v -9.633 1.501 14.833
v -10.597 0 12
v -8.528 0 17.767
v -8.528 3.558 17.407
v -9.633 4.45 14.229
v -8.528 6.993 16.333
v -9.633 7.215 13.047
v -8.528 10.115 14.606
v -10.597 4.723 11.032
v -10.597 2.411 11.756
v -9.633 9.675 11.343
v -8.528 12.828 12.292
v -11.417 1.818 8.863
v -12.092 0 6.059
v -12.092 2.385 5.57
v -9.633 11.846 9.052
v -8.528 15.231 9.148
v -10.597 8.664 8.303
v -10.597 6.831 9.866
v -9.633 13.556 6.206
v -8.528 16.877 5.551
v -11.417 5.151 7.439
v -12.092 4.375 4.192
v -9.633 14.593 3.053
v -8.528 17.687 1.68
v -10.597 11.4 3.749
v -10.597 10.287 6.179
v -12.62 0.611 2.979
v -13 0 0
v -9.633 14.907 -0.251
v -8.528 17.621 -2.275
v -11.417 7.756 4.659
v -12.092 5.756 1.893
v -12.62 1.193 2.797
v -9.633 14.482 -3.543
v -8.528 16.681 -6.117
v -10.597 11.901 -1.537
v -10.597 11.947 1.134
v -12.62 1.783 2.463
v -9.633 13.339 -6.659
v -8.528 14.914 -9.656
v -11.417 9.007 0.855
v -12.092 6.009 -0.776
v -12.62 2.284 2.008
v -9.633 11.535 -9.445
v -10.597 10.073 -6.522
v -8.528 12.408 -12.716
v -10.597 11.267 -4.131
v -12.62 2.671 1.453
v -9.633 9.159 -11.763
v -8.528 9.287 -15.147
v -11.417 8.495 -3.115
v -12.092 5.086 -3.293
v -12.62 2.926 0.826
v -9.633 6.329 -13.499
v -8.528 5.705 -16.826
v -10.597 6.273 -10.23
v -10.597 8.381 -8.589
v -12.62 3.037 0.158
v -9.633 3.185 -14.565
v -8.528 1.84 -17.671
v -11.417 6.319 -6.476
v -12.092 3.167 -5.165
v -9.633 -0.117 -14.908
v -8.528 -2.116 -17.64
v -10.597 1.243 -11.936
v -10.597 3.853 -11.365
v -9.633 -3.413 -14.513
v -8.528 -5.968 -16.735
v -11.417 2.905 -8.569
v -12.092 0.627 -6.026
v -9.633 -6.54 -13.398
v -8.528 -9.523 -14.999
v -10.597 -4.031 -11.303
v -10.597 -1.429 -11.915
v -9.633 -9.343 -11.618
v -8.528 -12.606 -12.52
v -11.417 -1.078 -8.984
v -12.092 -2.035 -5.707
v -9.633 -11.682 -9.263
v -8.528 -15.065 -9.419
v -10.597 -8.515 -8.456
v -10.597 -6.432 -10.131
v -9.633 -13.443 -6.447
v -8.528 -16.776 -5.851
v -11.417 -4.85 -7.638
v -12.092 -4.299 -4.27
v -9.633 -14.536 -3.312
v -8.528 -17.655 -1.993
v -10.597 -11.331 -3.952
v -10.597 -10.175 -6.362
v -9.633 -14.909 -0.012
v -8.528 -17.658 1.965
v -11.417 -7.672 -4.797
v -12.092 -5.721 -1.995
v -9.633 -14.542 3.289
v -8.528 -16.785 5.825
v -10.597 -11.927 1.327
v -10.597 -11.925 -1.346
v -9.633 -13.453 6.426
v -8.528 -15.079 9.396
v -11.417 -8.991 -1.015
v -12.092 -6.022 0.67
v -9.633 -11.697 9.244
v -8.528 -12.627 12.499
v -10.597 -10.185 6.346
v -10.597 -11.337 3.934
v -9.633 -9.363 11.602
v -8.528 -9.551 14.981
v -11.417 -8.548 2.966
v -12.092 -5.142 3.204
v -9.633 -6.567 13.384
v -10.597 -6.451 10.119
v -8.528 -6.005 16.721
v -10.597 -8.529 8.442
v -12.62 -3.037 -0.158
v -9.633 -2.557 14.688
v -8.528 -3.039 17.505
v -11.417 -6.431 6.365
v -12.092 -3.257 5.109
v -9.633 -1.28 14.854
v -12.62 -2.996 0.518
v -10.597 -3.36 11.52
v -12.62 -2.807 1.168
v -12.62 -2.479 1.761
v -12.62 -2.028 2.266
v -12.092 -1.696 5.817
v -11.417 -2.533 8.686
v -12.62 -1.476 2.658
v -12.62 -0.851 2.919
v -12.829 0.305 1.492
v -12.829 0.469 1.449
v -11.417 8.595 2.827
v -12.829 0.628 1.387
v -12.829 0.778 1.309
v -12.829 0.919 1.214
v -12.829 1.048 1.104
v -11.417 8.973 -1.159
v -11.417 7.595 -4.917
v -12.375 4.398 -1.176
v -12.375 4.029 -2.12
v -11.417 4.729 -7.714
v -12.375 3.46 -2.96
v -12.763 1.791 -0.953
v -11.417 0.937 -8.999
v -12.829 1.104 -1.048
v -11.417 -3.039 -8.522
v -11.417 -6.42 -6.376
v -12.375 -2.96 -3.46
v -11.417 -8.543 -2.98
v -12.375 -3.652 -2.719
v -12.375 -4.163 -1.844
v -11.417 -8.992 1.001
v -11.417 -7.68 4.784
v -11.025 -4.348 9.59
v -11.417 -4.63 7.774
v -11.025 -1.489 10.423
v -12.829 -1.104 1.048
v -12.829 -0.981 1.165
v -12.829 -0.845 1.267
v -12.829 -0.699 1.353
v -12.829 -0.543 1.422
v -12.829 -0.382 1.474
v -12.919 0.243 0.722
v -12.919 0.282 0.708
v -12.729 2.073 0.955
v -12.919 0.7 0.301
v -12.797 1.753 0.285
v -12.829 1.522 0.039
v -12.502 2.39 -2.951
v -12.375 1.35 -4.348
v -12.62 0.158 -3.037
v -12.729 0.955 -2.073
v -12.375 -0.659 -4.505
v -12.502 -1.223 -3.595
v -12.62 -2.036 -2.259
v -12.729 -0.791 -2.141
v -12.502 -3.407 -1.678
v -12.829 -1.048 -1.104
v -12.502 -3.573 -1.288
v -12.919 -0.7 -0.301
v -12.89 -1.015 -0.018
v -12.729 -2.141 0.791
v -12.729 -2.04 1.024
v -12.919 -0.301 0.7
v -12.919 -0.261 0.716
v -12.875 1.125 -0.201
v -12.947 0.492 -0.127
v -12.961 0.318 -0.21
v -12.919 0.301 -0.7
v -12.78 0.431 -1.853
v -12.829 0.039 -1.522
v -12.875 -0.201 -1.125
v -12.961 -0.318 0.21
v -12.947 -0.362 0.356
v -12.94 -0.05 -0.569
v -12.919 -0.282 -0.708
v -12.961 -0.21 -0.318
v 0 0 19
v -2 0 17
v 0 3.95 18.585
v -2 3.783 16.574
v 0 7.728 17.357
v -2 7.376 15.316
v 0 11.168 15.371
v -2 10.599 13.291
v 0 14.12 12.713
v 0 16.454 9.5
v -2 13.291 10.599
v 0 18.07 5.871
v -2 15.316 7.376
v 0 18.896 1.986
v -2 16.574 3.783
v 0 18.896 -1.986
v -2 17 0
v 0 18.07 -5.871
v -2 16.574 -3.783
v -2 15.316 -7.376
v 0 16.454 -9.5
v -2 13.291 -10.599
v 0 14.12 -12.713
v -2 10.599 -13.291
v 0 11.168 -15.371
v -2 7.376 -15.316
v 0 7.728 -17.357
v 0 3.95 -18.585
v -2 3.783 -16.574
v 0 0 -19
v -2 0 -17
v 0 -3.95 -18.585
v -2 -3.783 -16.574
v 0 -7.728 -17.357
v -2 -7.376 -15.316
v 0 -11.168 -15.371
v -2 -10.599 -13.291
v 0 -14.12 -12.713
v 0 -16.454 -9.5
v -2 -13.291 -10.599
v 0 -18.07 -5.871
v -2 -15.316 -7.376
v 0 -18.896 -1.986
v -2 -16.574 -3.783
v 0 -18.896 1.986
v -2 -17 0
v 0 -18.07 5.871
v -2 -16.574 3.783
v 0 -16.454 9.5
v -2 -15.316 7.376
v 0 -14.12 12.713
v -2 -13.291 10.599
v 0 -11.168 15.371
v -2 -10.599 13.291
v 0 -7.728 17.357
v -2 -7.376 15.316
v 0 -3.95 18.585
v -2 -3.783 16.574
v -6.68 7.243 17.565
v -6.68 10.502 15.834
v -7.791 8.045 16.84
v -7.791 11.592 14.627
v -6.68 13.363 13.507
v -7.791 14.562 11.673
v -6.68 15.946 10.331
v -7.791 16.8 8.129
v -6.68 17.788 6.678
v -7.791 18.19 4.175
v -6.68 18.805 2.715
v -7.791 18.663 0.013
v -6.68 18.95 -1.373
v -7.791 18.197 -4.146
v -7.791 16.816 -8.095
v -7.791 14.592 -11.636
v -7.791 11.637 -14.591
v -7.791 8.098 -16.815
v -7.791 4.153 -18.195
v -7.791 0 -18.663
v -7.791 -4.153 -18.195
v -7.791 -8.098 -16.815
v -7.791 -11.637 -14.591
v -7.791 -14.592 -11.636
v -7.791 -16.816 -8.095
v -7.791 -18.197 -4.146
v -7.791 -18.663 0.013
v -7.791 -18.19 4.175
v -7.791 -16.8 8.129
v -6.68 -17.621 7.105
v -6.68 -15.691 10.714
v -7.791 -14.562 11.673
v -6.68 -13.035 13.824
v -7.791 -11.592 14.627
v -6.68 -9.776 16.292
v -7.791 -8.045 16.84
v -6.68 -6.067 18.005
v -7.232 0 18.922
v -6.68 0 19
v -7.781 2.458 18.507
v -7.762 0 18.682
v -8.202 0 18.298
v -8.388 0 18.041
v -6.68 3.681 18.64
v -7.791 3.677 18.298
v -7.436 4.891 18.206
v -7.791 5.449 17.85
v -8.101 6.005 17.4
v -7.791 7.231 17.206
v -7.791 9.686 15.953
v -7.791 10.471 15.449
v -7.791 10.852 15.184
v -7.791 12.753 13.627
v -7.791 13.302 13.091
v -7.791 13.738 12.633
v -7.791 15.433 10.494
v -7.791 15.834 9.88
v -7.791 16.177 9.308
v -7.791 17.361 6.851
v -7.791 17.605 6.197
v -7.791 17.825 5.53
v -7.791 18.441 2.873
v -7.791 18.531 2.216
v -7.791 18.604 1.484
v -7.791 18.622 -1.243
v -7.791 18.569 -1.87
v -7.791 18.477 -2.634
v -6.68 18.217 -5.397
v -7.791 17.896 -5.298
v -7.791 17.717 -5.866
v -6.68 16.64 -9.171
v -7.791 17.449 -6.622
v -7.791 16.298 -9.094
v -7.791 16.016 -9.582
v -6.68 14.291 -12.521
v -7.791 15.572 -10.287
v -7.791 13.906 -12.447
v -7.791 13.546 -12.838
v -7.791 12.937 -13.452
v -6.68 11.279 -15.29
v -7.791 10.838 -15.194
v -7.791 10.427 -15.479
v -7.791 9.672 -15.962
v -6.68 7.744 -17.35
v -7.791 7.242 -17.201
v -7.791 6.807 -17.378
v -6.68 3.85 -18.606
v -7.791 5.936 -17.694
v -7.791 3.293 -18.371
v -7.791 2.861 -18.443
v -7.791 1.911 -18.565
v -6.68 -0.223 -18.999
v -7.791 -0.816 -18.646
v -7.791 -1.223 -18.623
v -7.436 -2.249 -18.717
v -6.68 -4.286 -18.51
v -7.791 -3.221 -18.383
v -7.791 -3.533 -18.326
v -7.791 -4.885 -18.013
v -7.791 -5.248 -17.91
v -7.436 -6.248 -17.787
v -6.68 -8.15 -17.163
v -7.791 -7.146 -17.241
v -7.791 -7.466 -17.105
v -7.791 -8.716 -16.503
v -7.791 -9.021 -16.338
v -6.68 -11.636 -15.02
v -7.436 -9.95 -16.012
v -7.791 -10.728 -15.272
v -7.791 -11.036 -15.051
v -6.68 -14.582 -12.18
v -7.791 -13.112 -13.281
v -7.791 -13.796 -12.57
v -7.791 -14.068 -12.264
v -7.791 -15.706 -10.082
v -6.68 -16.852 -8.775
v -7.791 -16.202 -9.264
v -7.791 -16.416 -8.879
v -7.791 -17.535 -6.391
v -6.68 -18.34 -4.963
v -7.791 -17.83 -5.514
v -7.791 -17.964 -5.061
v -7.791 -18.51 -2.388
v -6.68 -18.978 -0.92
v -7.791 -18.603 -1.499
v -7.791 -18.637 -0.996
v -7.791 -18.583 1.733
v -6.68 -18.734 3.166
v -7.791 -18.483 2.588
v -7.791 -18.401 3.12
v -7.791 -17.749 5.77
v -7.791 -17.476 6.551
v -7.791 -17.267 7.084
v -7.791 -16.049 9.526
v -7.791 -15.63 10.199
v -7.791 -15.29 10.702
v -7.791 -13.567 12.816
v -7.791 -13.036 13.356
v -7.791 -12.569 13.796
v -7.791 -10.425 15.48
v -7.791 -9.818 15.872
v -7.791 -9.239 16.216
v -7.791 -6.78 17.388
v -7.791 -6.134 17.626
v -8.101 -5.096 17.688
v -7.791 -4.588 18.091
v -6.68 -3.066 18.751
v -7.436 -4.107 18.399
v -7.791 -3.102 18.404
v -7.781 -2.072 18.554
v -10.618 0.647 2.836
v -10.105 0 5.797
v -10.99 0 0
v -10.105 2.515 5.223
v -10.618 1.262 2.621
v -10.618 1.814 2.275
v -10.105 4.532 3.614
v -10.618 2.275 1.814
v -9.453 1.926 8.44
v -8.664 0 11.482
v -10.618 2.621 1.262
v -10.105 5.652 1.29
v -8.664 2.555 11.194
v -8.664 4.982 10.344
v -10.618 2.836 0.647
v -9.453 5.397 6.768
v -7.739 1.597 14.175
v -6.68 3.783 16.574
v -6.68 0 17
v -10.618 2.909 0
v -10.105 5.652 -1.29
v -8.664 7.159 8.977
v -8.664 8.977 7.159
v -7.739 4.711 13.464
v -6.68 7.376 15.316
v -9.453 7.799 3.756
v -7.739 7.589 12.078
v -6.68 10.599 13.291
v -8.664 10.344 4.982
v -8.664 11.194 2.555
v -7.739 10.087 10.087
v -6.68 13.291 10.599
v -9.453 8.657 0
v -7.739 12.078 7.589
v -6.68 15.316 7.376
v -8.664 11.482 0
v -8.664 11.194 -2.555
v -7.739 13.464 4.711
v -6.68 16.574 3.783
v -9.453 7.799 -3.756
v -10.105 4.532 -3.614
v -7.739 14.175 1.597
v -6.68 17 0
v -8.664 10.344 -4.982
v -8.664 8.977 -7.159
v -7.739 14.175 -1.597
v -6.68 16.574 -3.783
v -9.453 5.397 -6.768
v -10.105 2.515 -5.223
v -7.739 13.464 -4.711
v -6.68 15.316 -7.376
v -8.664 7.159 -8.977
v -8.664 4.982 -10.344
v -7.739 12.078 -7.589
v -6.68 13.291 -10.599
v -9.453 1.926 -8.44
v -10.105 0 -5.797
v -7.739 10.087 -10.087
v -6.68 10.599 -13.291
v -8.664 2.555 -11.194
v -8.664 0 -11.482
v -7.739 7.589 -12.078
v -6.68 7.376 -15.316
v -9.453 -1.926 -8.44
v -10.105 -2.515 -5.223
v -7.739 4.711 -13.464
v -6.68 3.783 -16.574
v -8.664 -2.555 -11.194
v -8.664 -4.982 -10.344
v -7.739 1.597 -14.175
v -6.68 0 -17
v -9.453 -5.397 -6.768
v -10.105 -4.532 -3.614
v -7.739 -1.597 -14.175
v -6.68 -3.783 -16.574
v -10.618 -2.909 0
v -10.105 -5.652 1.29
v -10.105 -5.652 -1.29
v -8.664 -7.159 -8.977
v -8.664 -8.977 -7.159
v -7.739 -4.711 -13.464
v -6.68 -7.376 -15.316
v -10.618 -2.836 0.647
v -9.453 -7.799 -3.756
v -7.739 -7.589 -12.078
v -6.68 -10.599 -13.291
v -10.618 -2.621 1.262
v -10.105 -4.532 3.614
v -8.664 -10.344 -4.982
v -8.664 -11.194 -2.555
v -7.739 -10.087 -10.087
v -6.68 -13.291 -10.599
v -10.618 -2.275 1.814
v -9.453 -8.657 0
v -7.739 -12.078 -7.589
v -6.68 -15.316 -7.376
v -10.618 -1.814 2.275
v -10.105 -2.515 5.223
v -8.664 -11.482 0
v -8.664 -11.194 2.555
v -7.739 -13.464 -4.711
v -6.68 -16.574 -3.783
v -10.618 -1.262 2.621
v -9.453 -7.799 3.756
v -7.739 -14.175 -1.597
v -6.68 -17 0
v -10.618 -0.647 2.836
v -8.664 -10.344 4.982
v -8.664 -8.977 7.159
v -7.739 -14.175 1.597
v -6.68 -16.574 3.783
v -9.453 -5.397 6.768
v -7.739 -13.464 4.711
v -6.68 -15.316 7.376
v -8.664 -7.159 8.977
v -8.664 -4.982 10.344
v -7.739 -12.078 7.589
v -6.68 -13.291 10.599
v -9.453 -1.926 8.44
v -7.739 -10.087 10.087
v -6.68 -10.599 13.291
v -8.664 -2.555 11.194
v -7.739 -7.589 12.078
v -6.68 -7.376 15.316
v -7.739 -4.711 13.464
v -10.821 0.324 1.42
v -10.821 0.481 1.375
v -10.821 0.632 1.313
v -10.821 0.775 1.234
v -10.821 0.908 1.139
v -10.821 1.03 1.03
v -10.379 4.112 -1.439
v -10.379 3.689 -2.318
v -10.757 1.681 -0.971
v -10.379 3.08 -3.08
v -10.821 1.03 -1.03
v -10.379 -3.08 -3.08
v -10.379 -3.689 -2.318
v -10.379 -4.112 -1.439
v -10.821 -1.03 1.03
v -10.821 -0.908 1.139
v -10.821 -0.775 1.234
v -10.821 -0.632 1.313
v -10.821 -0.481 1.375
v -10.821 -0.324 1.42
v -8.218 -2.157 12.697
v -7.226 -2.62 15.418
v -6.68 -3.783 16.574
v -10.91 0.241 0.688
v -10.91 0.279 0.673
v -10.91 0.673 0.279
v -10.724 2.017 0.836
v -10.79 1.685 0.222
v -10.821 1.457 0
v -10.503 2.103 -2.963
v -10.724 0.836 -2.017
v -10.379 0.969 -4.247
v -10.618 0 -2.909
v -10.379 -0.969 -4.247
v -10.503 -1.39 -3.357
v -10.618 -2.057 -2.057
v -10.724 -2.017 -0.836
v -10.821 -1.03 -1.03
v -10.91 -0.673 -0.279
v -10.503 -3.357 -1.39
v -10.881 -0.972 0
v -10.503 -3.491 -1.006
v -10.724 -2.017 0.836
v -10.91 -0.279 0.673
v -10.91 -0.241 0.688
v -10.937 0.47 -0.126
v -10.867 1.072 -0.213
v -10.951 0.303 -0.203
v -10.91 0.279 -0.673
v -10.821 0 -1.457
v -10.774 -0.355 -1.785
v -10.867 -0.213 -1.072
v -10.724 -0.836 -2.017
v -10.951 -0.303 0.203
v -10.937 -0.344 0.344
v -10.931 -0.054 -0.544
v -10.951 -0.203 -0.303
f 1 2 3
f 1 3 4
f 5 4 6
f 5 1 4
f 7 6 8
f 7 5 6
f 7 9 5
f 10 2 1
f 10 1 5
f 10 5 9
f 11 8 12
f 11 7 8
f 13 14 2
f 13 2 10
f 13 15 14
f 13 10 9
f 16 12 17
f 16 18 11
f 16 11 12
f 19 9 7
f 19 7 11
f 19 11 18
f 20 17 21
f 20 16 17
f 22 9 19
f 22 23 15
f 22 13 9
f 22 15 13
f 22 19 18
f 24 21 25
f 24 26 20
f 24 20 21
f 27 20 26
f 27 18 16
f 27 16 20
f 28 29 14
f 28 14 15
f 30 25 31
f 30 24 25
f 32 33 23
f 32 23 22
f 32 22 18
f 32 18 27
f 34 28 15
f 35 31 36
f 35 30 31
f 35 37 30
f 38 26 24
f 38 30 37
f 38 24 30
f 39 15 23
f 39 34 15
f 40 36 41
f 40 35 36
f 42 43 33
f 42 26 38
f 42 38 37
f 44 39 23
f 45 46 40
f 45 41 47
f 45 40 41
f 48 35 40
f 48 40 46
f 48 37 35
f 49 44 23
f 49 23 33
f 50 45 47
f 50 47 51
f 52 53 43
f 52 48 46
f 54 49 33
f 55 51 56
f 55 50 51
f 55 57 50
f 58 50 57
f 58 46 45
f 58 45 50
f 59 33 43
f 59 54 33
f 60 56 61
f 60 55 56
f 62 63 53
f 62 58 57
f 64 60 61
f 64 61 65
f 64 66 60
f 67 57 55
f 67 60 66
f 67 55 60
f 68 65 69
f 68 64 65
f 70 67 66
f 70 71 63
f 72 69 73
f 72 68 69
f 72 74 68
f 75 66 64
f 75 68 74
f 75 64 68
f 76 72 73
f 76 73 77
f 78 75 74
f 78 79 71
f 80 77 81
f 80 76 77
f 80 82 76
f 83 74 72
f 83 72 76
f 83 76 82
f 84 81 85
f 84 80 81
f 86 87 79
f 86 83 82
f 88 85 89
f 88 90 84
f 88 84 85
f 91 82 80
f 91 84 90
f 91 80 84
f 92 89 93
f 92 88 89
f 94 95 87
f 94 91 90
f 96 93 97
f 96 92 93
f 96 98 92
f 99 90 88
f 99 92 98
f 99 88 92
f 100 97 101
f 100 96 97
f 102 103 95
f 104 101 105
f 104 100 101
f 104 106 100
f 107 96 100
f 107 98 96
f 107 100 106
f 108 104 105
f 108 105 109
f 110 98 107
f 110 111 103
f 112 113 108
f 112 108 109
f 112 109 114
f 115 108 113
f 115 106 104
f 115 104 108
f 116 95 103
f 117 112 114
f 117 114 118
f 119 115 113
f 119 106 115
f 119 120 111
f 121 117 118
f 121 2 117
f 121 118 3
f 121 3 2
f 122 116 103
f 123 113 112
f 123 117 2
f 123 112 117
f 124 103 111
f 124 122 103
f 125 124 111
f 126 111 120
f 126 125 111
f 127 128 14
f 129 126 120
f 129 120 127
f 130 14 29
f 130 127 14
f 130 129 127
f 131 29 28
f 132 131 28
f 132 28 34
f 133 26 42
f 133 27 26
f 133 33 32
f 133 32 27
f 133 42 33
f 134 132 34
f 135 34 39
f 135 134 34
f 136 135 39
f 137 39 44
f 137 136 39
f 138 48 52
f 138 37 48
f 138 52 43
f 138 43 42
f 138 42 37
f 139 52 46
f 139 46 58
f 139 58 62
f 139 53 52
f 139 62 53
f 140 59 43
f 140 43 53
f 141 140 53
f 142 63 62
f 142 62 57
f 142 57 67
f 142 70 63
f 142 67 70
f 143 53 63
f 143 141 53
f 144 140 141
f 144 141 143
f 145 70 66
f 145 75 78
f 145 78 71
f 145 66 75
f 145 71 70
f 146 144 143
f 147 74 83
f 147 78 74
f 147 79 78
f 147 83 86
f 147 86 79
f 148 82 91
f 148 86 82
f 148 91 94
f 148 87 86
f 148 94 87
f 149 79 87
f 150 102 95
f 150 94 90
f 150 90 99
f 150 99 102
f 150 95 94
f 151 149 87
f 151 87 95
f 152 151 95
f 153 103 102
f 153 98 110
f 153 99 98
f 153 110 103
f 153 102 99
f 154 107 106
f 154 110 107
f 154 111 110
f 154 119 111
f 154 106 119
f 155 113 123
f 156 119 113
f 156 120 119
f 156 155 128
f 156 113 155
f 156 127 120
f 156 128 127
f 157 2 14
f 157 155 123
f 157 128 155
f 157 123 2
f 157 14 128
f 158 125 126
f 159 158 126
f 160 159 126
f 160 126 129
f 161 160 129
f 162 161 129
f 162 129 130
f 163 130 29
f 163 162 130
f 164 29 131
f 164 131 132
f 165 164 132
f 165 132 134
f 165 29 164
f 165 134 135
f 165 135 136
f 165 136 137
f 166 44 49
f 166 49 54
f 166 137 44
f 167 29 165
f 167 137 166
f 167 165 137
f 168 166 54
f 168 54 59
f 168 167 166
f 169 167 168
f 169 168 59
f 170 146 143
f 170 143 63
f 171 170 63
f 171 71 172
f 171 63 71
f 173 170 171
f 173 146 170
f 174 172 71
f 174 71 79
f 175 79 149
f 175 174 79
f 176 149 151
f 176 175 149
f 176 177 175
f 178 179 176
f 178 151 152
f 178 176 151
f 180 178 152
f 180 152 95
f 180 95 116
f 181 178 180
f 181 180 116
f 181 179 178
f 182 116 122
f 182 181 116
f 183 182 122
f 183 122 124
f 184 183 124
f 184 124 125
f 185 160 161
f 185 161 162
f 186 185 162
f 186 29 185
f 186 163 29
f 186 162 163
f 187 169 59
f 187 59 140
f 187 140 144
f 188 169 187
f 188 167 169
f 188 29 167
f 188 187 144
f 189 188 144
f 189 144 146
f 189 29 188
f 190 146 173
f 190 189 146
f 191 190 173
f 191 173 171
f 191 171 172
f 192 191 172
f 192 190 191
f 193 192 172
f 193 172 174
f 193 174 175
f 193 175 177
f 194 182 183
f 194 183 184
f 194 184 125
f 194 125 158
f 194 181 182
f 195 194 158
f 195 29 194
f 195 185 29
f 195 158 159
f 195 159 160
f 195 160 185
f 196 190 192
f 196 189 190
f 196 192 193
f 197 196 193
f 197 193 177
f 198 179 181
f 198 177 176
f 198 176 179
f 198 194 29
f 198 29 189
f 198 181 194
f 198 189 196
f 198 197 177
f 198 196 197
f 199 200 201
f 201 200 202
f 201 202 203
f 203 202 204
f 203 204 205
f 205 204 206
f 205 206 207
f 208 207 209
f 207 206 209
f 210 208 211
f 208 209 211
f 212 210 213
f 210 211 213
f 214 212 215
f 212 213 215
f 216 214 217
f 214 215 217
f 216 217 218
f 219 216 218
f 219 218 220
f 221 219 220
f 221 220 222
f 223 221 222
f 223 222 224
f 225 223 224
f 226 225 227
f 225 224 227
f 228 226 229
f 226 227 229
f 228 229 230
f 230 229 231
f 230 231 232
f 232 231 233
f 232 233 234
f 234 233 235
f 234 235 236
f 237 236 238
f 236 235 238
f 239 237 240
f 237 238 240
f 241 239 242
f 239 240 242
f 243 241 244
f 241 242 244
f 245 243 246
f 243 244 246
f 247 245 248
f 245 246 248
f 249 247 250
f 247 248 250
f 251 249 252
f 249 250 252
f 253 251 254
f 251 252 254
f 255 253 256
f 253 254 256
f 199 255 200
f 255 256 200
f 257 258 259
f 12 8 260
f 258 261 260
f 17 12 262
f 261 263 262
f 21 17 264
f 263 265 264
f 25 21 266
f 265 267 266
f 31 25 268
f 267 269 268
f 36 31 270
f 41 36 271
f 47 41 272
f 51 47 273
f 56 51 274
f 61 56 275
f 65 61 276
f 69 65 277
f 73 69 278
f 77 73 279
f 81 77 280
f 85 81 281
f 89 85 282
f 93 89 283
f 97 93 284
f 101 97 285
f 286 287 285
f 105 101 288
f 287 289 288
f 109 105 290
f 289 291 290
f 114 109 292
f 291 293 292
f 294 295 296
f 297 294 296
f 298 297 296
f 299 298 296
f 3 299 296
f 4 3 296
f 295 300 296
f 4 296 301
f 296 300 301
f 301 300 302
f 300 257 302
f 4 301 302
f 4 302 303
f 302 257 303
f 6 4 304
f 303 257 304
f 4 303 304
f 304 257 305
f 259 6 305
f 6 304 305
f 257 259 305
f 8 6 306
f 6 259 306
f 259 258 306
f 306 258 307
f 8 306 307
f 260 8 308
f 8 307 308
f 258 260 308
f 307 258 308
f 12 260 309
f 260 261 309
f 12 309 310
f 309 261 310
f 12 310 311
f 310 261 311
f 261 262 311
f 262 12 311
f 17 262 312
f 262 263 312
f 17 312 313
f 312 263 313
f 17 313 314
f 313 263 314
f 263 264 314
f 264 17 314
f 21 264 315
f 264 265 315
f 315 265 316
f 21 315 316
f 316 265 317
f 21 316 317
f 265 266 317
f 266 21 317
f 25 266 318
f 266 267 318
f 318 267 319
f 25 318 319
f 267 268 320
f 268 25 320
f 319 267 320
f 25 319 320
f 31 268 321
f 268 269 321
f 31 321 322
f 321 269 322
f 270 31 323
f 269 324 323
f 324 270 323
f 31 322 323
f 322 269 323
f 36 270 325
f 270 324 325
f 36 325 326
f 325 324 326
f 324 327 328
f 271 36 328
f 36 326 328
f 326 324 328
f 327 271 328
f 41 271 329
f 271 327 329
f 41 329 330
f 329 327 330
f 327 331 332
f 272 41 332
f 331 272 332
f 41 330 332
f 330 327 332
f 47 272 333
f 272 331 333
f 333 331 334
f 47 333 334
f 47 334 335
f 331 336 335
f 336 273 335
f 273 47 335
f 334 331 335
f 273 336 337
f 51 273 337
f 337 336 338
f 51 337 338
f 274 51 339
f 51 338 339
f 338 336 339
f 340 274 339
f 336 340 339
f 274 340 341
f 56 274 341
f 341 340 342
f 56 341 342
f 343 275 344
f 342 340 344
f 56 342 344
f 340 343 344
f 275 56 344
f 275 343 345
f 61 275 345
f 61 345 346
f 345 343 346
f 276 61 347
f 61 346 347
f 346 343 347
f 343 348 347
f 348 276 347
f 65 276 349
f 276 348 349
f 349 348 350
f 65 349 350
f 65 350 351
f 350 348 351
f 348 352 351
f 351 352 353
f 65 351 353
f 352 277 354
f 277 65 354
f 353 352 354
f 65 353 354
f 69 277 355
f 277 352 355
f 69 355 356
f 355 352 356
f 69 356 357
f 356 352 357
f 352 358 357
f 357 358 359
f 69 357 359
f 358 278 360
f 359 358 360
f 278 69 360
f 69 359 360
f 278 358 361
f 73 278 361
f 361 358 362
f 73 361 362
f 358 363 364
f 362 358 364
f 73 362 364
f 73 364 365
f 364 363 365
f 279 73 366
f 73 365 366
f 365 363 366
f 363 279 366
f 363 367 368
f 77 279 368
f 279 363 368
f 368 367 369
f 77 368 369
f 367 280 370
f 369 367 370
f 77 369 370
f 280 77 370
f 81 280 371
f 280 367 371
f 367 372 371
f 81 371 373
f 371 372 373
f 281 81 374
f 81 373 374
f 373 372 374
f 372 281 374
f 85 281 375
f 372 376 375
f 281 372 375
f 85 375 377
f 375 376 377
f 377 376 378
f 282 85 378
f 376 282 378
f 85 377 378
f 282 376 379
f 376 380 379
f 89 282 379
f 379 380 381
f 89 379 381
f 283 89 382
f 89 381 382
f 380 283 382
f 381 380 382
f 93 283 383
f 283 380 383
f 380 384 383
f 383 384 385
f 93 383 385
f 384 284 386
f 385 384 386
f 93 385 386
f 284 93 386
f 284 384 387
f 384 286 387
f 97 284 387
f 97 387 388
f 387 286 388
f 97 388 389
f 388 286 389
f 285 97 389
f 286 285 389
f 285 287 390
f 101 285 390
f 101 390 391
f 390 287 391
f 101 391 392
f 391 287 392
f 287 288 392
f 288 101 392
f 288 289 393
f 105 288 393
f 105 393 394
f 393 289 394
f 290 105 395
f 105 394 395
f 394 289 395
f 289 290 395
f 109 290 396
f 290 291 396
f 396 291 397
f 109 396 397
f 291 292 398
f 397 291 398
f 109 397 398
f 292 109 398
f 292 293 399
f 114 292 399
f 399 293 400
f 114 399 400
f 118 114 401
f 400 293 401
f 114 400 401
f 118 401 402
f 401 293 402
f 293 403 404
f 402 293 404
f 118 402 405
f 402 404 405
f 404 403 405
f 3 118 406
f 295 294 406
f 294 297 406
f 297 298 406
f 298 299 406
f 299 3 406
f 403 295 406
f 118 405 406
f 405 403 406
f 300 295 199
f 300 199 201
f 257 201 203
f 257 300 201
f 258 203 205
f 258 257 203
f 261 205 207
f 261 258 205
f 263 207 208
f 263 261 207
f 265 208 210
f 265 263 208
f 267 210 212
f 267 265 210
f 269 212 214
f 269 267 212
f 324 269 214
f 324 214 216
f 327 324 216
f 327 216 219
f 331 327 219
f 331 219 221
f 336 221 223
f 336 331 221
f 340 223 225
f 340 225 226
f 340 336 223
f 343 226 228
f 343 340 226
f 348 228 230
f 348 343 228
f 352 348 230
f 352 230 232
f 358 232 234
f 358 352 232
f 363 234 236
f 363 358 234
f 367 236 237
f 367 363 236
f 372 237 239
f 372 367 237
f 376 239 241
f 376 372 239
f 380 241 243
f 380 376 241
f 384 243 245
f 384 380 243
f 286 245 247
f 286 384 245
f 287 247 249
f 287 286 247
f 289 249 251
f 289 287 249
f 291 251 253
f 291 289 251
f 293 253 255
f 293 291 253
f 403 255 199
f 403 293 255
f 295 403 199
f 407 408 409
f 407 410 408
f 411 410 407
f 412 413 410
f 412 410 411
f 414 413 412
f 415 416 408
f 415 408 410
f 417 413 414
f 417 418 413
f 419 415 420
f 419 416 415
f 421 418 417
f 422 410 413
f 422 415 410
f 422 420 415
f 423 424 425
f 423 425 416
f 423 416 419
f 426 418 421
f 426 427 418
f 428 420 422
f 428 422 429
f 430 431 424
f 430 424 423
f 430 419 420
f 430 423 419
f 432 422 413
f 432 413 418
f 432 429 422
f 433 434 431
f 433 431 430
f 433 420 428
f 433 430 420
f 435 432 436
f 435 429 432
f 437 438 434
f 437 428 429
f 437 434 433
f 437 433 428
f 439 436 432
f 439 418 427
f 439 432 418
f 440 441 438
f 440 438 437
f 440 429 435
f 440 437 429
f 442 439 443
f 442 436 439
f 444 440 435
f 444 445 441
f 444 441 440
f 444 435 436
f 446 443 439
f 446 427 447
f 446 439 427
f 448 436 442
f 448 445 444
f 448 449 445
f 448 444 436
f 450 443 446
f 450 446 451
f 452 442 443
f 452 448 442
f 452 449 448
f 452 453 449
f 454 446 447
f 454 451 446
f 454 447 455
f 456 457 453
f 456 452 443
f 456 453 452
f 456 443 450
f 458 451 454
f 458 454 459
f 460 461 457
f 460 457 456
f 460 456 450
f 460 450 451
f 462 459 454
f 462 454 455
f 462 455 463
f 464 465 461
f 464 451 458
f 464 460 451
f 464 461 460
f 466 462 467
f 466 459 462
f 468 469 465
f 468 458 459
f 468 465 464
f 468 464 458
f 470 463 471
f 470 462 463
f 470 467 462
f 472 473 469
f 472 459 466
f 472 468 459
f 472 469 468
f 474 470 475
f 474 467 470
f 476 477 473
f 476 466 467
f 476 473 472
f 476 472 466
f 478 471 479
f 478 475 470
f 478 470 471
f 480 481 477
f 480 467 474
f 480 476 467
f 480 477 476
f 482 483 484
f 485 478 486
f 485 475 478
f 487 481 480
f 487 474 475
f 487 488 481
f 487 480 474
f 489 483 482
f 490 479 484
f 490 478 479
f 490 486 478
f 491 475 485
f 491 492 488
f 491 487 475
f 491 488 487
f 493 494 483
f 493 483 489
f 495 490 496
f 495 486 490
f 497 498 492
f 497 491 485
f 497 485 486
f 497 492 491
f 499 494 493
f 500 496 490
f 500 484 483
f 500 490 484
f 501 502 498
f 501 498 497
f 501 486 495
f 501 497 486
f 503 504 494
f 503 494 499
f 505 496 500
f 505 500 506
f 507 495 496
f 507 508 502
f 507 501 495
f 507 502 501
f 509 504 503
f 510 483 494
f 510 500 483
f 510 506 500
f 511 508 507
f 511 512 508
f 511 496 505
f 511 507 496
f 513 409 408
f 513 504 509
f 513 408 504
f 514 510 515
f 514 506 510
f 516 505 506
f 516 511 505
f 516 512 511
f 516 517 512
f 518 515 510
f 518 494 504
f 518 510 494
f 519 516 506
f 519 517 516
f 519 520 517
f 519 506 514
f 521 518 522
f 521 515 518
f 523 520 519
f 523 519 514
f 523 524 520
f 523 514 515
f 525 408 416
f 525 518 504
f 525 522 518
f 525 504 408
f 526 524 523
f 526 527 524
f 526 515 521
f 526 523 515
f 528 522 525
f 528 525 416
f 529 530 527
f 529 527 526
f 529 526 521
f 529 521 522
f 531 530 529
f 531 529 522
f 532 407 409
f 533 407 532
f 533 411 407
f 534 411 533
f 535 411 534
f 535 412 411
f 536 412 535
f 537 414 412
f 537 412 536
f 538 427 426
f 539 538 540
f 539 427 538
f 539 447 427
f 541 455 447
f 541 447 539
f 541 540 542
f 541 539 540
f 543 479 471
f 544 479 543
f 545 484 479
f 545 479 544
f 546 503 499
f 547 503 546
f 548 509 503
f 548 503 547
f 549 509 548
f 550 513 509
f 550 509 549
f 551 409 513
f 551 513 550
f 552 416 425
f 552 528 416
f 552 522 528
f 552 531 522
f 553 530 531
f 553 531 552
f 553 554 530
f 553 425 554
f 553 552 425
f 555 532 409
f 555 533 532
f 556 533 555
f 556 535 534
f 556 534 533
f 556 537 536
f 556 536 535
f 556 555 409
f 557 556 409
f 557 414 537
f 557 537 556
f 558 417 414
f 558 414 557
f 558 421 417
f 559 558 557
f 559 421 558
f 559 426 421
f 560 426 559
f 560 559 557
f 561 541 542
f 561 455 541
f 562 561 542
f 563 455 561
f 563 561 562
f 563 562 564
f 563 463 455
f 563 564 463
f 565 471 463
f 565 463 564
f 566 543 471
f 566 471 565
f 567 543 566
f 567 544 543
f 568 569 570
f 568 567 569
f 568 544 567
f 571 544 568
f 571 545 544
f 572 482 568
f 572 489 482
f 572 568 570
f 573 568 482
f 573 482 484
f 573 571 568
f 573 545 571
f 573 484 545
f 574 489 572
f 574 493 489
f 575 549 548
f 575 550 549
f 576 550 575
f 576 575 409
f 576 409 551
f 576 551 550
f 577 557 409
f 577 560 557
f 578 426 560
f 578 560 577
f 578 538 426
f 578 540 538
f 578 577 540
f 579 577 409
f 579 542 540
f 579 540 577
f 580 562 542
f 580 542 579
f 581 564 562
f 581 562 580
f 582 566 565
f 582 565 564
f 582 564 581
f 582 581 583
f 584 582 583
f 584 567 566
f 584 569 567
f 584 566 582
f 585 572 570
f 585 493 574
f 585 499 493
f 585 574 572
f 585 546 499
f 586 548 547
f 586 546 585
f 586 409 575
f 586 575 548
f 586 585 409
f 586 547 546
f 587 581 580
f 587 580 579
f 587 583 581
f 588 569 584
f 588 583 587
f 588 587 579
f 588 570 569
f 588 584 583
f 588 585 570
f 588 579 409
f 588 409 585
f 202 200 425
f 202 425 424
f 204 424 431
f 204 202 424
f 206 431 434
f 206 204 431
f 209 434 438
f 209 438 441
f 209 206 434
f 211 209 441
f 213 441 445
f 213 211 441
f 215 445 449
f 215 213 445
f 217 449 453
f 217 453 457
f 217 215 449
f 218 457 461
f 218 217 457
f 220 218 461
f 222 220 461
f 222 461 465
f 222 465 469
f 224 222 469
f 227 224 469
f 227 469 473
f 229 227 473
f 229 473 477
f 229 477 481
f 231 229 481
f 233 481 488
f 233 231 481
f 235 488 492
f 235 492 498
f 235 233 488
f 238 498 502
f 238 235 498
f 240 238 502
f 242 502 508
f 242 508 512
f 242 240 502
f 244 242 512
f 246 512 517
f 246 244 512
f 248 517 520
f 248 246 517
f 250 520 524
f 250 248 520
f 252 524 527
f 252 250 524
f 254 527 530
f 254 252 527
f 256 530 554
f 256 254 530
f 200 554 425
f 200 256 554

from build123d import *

# Parameters (mm, degrees)
F2_R    = 2
F3_SIZE = 1.99999


# Not quite as in the source:
# - a fillet or chamfer is up to 0.001 mm smaller than in the source, because OpenCascade refuses the exact size


with BuildPart() as f1:
    # F0 (on Front) → F1 (revolve)
    with BuildSketch(Plane.XZ):
        with BuildLine():
            Line((-13, 0), (-10.9896817121, 0))
            ThreePointArc((-10.9896817121, 0), (-9.4533501693, 8.6567410673), (-6.6803534332, 17))
            Line((-6.6803534332, 17), (0, 17))
            Line((0, 17), (0, 19))
            Line((0, 19), (-8, 19))
            ThreePointArc((-8, 19), (-11.2501561273, 9.6974095072), (-13, 0))
        make_face()
    revolve(axis=Axis((-6.5, 0, 0), (-1, 0, 0)))

    # F2
    f2_edges = [f1.edges().sort_by_distance(p)[0] for p in [
        (-8, 0, -19),
    ]]
    fillet(f2_edges, radius=F2_R)

    # F3 (size 2 in the source; OpenCascade refuses exactly that, so slightly less here)
    f3_edges = [f1.edges().sort_by_distance(p)[0] for p in [
        (0, 0, -17),
    ]]
    chamfer(f3_edges, length=F3_SIZE)


solid = f1.part
